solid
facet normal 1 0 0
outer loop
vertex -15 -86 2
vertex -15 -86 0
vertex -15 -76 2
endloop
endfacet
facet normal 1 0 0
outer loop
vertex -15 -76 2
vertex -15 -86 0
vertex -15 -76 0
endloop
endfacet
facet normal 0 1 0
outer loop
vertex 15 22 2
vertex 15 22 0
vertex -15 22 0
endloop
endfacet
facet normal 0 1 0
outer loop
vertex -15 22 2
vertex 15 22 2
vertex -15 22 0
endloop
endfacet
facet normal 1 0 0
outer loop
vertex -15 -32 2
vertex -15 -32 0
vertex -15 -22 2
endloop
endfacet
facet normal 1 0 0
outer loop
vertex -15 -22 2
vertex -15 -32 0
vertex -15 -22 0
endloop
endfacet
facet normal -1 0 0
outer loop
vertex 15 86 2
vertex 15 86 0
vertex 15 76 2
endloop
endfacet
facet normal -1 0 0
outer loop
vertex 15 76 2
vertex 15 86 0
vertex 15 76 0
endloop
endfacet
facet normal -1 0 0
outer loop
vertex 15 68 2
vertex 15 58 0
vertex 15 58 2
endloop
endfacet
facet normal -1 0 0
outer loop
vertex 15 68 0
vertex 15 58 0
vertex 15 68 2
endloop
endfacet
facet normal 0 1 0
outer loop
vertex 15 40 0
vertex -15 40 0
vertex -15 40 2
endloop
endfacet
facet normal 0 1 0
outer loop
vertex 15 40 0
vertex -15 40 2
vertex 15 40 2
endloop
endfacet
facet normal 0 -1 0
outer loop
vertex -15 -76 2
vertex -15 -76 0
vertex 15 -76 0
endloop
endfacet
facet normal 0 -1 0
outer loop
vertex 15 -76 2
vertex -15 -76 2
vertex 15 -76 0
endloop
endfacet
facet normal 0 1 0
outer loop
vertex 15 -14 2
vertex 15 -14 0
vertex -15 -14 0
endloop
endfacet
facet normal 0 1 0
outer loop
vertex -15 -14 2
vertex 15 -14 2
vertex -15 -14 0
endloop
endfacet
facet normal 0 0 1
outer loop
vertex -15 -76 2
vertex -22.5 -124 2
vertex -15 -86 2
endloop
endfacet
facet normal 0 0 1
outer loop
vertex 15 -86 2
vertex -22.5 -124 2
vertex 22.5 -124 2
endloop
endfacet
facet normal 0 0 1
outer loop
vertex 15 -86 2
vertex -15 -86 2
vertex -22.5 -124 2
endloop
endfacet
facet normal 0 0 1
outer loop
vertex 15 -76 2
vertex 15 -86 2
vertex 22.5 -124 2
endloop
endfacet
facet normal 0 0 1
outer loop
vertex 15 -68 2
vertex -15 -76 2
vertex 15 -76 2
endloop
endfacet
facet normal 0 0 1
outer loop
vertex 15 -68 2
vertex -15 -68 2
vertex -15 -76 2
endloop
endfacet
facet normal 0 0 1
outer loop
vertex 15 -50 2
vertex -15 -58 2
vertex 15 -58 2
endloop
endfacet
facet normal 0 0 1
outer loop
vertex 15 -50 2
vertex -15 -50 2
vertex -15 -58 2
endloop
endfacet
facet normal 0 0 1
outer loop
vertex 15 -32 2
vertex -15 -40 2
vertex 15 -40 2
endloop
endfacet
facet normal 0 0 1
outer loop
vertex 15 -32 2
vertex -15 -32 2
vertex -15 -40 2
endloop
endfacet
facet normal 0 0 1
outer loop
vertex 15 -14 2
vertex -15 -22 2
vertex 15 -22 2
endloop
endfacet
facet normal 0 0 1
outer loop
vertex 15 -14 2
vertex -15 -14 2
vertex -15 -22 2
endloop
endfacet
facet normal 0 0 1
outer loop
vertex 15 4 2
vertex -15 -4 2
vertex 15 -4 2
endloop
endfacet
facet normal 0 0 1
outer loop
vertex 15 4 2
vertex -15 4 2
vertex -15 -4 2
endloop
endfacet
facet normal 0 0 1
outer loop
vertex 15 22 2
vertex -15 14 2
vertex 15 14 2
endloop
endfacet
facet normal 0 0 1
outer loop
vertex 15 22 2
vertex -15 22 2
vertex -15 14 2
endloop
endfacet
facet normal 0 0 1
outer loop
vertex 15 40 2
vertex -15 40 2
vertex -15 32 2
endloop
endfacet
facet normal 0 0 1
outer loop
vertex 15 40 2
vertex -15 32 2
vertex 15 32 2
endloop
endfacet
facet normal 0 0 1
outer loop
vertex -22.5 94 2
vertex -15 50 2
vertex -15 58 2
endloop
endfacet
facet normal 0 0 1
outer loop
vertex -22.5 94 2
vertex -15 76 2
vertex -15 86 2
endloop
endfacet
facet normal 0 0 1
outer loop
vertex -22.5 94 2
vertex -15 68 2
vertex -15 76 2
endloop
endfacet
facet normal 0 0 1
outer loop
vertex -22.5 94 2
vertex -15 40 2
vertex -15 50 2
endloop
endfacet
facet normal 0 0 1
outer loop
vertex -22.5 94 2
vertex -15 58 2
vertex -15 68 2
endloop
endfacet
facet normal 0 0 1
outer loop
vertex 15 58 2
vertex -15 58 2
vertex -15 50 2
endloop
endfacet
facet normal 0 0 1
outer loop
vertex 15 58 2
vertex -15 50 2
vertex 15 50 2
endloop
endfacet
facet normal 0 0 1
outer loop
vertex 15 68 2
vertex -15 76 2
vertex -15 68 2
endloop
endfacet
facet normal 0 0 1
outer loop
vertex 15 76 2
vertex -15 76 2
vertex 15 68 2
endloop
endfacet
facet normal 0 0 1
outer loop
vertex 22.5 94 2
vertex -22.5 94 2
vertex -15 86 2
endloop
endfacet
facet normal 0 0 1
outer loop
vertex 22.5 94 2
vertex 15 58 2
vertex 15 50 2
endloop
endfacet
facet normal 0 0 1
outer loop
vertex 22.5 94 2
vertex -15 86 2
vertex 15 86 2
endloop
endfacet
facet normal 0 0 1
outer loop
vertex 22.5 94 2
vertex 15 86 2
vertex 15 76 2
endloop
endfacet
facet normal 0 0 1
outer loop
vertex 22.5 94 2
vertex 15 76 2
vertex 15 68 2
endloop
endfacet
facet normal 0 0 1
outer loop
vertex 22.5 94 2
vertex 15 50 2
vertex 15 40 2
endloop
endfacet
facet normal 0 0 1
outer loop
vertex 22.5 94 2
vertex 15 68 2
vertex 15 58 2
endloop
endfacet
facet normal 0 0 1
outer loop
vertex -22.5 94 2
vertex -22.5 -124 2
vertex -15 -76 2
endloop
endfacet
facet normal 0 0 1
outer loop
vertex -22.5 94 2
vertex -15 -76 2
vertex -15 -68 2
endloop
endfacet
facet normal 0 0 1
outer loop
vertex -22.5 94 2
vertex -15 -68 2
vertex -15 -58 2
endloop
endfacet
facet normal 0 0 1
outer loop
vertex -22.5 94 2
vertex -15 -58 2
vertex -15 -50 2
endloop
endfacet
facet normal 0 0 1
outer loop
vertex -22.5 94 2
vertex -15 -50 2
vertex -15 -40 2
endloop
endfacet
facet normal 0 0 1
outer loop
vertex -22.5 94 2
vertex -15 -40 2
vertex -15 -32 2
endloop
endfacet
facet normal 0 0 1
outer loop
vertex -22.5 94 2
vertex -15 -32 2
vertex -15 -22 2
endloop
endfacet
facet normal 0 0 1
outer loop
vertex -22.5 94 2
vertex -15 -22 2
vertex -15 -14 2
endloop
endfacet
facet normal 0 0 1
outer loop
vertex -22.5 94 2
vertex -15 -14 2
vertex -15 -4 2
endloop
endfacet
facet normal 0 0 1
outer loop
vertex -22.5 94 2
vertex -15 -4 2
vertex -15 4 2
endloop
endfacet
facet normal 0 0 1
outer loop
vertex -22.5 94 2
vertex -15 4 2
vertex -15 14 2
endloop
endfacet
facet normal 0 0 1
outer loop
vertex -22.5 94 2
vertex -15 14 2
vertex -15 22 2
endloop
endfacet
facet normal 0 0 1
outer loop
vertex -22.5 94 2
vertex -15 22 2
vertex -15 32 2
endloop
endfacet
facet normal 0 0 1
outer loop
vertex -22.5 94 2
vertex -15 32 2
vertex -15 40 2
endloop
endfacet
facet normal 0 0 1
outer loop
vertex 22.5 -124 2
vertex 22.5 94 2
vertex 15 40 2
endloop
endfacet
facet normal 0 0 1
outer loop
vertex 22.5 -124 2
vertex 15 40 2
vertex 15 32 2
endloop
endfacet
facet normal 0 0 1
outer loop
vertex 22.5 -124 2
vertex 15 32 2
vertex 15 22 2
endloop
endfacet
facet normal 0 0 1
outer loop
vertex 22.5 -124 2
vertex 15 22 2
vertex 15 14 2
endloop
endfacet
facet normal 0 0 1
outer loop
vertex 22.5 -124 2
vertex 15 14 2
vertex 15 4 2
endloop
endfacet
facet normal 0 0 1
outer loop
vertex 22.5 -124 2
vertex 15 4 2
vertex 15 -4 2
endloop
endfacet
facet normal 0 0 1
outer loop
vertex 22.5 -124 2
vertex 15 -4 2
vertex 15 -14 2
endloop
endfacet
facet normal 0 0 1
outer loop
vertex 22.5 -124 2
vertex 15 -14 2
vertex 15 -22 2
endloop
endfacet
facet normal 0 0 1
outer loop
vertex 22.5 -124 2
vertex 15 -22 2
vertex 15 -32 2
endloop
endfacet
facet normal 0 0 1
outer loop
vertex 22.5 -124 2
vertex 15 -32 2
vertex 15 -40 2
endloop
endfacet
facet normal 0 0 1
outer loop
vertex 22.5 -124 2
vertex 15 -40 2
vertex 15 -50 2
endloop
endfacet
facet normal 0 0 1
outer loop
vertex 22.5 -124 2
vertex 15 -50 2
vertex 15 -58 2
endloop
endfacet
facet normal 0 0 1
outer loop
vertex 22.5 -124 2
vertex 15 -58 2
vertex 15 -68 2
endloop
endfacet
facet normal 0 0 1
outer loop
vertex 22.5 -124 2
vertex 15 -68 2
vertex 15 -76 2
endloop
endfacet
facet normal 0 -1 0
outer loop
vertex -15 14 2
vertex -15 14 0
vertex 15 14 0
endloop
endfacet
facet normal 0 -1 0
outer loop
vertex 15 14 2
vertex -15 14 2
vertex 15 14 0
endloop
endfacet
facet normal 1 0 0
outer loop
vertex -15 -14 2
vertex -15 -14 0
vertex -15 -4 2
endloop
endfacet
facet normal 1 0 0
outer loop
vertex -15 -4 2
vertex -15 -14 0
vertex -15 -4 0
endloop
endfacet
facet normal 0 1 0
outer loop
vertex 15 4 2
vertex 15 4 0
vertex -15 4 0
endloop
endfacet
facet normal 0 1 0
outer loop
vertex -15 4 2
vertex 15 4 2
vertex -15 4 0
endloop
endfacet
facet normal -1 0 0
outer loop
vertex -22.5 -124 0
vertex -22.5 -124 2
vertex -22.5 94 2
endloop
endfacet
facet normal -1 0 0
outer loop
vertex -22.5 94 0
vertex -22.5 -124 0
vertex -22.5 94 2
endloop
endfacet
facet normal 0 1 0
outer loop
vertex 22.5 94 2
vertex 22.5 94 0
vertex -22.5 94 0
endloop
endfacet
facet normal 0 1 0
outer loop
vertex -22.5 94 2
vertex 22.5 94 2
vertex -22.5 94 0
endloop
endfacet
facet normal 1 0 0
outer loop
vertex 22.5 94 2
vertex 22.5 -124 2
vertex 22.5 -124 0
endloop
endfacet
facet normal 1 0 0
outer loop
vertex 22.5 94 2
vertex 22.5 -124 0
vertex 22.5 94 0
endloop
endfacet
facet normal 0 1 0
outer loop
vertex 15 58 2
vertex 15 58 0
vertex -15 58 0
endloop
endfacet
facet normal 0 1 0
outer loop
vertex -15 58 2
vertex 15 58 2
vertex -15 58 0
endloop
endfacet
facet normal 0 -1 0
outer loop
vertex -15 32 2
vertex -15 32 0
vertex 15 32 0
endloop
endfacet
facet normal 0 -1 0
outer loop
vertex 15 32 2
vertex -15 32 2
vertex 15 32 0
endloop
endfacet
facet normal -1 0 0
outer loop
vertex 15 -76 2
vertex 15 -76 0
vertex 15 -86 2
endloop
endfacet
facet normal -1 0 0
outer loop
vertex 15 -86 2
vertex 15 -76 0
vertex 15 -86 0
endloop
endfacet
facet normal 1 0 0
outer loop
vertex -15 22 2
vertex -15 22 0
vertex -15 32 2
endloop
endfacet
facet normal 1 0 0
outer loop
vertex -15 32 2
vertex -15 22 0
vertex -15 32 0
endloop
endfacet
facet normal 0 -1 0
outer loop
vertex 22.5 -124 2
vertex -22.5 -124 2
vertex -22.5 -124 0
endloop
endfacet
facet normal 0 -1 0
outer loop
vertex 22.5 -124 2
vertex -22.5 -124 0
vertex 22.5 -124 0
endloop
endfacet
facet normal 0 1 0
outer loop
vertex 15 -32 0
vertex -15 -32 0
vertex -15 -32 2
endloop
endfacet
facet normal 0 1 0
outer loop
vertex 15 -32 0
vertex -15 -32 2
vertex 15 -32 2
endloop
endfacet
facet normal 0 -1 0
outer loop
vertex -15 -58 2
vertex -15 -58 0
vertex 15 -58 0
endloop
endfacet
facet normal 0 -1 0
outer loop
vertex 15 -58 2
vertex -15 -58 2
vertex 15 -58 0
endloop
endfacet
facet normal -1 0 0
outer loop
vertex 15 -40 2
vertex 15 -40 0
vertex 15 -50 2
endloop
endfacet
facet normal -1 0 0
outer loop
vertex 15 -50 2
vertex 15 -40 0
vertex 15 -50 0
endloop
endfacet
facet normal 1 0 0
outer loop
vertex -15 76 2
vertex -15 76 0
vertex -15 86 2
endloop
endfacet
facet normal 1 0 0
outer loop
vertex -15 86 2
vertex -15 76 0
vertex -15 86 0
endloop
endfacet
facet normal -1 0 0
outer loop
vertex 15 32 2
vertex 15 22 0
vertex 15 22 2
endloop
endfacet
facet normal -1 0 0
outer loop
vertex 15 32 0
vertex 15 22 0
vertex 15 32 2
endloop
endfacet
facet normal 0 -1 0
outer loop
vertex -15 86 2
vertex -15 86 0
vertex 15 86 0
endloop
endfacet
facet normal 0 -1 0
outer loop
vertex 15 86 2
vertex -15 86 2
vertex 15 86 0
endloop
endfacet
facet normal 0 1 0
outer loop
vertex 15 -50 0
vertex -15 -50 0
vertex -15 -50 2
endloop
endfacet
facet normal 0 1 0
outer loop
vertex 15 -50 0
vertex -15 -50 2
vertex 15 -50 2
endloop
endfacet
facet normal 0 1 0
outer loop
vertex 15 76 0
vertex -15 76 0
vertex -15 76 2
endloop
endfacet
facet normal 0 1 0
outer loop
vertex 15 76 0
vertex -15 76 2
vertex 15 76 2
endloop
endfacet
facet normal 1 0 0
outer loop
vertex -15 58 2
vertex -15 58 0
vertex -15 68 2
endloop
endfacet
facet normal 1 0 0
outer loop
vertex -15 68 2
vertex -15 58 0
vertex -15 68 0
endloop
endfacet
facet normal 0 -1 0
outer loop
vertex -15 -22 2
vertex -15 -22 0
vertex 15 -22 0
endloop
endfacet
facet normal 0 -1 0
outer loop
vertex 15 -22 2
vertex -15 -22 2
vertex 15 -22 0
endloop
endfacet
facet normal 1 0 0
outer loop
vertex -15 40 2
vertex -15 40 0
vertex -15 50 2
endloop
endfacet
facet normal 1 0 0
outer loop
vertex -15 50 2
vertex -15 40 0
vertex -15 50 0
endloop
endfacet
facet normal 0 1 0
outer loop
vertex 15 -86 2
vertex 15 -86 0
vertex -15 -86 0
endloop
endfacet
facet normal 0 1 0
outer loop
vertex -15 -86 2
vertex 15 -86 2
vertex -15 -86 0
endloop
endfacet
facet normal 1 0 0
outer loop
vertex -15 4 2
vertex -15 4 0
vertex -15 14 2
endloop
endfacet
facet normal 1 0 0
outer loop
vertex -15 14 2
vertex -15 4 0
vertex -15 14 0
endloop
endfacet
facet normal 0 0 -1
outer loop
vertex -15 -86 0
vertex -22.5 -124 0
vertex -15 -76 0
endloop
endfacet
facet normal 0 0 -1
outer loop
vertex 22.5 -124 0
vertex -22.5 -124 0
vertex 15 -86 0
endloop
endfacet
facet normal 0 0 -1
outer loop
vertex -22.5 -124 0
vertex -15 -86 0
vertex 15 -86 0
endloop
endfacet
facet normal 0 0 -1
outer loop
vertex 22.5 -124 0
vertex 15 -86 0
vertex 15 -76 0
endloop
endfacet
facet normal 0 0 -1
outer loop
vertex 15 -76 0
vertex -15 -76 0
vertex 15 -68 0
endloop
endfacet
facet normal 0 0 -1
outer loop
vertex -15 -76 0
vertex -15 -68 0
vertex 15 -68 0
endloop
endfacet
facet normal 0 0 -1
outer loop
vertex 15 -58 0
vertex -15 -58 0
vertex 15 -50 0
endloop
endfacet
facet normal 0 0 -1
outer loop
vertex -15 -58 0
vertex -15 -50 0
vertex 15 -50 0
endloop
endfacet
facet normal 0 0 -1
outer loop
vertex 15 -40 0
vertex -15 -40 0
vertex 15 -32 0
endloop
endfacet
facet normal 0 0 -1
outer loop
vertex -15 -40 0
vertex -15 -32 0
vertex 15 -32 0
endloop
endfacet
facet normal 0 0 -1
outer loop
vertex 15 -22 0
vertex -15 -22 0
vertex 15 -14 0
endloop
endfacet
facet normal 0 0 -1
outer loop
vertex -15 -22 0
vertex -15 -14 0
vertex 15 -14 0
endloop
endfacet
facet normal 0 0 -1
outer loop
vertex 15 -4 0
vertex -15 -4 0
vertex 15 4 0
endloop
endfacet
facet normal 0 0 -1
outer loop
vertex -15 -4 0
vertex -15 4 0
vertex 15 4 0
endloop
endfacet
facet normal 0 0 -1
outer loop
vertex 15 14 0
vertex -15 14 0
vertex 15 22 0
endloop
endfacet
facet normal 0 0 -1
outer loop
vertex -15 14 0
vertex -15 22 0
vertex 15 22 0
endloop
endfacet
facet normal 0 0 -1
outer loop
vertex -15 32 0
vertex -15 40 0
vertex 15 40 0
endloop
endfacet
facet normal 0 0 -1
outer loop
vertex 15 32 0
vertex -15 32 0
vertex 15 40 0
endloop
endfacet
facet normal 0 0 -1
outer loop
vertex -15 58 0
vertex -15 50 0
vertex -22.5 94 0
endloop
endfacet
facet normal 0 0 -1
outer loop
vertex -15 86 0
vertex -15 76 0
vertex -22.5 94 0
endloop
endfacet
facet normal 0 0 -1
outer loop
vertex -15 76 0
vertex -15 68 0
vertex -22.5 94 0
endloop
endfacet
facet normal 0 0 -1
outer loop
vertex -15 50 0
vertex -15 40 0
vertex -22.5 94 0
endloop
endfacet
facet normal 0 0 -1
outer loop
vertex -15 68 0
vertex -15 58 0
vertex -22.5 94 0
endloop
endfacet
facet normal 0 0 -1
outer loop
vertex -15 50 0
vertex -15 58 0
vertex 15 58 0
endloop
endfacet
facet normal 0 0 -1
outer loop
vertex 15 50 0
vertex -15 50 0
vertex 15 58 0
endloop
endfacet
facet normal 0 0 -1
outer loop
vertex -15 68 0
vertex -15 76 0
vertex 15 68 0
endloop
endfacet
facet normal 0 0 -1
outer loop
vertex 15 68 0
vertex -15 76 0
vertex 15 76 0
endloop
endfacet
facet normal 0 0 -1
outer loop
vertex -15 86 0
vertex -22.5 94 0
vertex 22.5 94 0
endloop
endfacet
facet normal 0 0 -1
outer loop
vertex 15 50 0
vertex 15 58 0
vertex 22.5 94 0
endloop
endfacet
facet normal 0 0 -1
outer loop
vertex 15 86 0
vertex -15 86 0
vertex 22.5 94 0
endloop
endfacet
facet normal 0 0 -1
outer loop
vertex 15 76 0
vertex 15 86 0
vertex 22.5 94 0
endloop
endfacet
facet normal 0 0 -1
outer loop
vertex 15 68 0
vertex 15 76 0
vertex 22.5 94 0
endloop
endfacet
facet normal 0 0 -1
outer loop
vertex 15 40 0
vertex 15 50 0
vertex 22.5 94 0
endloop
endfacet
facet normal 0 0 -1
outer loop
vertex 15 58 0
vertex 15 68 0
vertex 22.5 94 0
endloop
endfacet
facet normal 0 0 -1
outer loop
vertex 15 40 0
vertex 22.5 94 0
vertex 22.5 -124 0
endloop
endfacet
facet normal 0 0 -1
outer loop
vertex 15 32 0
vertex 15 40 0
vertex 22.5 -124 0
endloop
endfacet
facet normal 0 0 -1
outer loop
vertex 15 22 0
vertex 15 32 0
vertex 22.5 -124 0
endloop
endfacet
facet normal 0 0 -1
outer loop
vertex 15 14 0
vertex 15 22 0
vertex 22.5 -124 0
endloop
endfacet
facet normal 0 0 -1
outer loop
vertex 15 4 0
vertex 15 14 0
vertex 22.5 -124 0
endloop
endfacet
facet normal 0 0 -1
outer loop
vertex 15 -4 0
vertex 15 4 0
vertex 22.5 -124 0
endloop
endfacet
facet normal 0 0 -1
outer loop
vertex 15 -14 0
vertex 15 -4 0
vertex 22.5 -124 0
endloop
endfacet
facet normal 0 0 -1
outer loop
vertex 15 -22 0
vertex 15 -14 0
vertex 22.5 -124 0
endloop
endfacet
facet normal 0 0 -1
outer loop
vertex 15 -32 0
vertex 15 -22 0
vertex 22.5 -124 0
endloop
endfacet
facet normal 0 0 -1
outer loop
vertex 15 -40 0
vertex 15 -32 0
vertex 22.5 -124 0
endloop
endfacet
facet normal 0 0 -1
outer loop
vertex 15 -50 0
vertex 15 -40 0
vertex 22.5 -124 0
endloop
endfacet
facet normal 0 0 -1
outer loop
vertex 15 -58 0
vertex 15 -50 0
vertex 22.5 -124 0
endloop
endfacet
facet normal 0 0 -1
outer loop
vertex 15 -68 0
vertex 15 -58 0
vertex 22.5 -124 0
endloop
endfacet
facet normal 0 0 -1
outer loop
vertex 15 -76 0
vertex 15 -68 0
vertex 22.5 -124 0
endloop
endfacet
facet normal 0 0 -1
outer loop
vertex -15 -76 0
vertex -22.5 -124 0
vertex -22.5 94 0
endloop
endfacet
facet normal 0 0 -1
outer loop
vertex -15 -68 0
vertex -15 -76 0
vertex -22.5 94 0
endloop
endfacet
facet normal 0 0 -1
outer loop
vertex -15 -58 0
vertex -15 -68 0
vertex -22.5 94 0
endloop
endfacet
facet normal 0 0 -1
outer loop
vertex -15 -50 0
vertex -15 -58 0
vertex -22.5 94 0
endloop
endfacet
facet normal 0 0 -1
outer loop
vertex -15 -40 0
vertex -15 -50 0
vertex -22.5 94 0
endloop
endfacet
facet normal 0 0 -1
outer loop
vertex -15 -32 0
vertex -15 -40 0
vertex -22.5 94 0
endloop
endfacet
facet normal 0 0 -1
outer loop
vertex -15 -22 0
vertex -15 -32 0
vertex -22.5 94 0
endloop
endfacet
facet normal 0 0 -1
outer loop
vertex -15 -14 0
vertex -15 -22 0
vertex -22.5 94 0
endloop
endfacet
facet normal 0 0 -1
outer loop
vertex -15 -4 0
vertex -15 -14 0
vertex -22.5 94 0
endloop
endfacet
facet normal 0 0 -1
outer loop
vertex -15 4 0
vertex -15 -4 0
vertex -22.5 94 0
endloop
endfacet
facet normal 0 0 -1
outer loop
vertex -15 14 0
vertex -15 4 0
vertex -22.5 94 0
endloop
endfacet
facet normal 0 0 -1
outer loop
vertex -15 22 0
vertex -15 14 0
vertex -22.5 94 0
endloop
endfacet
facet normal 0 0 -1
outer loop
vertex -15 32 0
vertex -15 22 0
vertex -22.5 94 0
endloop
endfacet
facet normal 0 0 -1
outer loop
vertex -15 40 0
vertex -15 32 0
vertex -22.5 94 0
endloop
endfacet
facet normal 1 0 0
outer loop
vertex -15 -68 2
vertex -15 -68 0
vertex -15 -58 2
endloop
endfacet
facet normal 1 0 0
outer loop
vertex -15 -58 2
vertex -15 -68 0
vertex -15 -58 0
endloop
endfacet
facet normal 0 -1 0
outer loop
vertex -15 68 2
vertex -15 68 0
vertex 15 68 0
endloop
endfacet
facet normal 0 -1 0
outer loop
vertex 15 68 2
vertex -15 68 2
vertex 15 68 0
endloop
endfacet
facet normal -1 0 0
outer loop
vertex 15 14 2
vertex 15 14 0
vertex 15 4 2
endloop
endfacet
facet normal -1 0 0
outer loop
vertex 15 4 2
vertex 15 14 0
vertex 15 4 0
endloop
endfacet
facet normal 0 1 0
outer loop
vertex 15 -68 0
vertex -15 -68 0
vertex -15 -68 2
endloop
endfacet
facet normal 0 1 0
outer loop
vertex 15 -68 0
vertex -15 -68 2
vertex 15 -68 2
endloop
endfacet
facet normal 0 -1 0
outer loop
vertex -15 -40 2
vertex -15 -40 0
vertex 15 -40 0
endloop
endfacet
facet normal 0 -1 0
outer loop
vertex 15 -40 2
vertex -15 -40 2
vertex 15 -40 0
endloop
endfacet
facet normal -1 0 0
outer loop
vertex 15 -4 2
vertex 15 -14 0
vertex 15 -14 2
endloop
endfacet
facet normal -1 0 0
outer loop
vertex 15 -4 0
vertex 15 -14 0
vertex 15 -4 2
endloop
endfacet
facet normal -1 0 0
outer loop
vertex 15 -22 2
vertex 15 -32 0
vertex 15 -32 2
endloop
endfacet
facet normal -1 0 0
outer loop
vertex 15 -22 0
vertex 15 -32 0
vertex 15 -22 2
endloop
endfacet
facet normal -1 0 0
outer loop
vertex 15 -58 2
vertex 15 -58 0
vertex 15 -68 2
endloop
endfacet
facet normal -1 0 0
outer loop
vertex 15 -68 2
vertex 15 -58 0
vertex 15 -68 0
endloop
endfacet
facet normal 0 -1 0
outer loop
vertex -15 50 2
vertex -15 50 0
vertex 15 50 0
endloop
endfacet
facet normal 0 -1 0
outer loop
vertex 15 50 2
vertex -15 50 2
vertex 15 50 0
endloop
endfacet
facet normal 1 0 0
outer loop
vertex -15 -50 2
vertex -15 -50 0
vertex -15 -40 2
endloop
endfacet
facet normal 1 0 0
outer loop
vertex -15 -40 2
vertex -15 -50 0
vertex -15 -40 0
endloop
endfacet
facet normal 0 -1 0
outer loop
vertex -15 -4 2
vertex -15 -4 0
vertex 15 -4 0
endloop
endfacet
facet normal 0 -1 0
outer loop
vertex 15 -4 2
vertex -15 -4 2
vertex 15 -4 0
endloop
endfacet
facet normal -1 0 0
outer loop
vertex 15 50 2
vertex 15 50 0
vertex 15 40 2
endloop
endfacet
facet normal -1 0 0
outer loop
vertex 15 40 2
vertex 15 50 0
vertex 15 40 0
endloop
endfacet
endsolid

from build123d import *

# Parameters (mm, degrees)
SKETCH1_W           = 7.5
SKETCH1_H           = 8
SKETCH1_H_2         = 10
SKETCH1_W_2         = 30
BOSS_EXTRUDE1_DEPTH = 2
SKETCH2_W           = 45
SKETCH2_H           = 30
BOSS_EXTRUDE2_DEPTH = 2


with BuildPart() as part:
    # Sketch1 → Boss-Extrude1 (new body)
    with BuildSketch(Plane.XY):
        with Locations((-18.75, 90)):
            Rectangle(SKETCH1_W, SKETCH1_H)
        with Locations((-18.75, 81)):
            Rectangle(SKETCH1_W, SKETCH1_H_2)
        with Locations((-18.75, 72)):
            Rectangle(SKETCH1_W, SKETCH1_H)
        with Locations((-18.75, 63)):
            Rectangle(SKETCH1_W, SKETCH1_H_2)
        with Locations((-18.75, 54)):
            Rectangle(SKETCH1_W, SKETCH1_H)
        with Locations((-18.75, 45)):
            Rectangle(SKETCH1_W, SKETCH1_H_2)
        with Locations((0, 90)):
            Rectangle(SKETCH1_W_2, SKETCH1_H)
        with Locations((18.75, 90)):
            Rectangle(SKETCH1_W, SKETCH1_H)
        with Locations((18.75, 81)):
            Rectangle(SKETCH1_W, SKETCH1_H_2)
        with Locations((18.75, 72)):
            Rectangle(SKETCH1_W, SKETCH1_H)
        with Locations((0, 72)):
            Rectangle(SKETCH1_W_2, SKETCH1_H)
        with Locations((0, 54)):
            Rectangle(SKETCH1_W_2, SKETCH1_H)
        with Locations((18.75, 54)):
            Rectangle(SKETCH1_W, SKETCH1_H)
        with Locations((18.75, 63)):
            Rectangle(SKETCH1_W, SKETCH1_H_2)
        with Locations((18.75, 45)):
            Rectangle(SKETCH1_W, SKETCH1_H_2)
        with Locations((18.75, 36)):
            Rectangle(SKETCH1_W, SKETCH1_H)
        with Locations((0, 36)):
            Rectangle(SKETCH1_W_2, SKETCH1_H)
        with Locations((-18.75, 36)):
            Rectangle(SKETCH1_W, SKETCH1_H)
        with Locations((-18.75, 27)):
            Rectangle(SKETCH1_W, SKETCH1_H_2)
        with Locations((-18.75, 18)):
            Rectangle(SKETCH1_W, SKETCH1_H)
        with Locations((-18.75, 9)):
            Rectangle(SKETCH1_W, SKETCH1_H_2)
        with Locations((-18.75, 0)):
            Rectangle(SKETCH1_W, SKETCH1_H)
        Rectangle(SKETCH1_W_2, SKETCH1_H)
        with Locations((18.75, 0)):
            Rectangle(SKETCH1_W, SKETCH1_H)
        with Locations((18.75, 9)):
            Rectangle(SKETCH1_W, SKETCH1_H_2)
        with Locations((18.75, 18)):
            Rectangle(SKETCH1_W, SKETCH1_H)
        with Locations((0, 18)):
            Rectangle(SKETCH1_W_2, SKETCH1_H)
        with Locations((18.75, 27)):
            Rectangle(SKETCH1_W, SKETCH1_H_2)
        with Locations((-18.75, -9)):
            Rectangle(SKETCH1_W, SKETCH1_H_2)
        with Locations((-18.75, -18)):
            Rectangle(SKETCH1_W, SKETCH1_H)
        with Locations((-18.75, -27)):
            Rectangle(SKETCH1_W, SKETCH1_H_2)
        with Locations((-18.75, -36)):
            Rectangle(SKETCH1_W, SKETCH1_H)
        with Locations((-18.75, -45)):
            Rectangle(SKETCH1_W, SKETCH1_H_2)
        with Locations((0, -36)):
            Rectangle(SKETCH1_W_2, SKETCH1_H)
        with Locations((0, -18)):
            Rectangle(SKETCH1_W_2, SKETCH1_H)
        with Locations((18.75, -18)):
            Rectangle(SKETCH1_W, SKETCH1_H)
        with Locations((18.75, -9)):
            Rectangle(SKETCH1_W, SKETCH1_H_2)
        with Locations((18.75, -27)):
            Rectangle(SKETCH1_W, SKETCH1_H_2)
        with Locations((18.75, -36)):
            Rectangle(SKETCH1_W, SKETCH1_H)
        with Locations((-18.75, -54)):
            Rectangle(SKETCH1_W, SKETCH1_H)
        with Locations((-18.75, -63)):
            Rectangle(SKETCH1_W, SKETCH1_H_2)
        with Locations((-18.75, -72)):
            Rectangle(SKETCH1_W, SKETCH1_H)
        with Locations((-18.75, -81)):
            Rectangle(SKETCH1_W, SKETCH1_H_2)
        with Locations((-18.75, -90)):
            Rectangle(SKETCH1_W, SKETCH1_H)
        with Locations((0, -90)):
            Rectangle(SKETCH1_W_2, SKETCH1_H)
        with Locations((18.75, -90)):
            Rectangle(SKETCH1_W, SKETCH1_H)
        with Locations((18.75, -81)):
            Rectangle(SKETCH1_W, SKETCH1_H_2)
        with Locations((18.75, -72)):
            Rectangle(SKETCH1_W, SKETCH1_H)
        with Locations((18.75, -63)):
            Rectangle(SKETCH1_W, SKETCH1_H_2)
        with Locations((18.75, -54)):
            Rectangle(SKETCH1_W, SKETCH1_H)
        with Locations((18.75, -45)):
            Rectangle(SKETCH1_W, SKETCH1_H_2)
        with Locations((0, -54)):
            Rectangle(SKETCH1_W_2, SKETCH1_H)
        with Locations((0, -72)):
            Rectangle(SKETCH1_W_2, SKETCH1_H)
    extrude(amount=BOSS_EXTRUDE1_DEPTH)

    # Sketch2 → Boss-Extrude2 (add)
    with BuildSketch(Plane.XY.offset(2)):
        with Locations((0, -109)):
            Rectangle(SKETCH2_W, SKETCH2_H)
    extrude(amount=-BOSS_EXTRUDE2_DEPTH)


solid = part.part
